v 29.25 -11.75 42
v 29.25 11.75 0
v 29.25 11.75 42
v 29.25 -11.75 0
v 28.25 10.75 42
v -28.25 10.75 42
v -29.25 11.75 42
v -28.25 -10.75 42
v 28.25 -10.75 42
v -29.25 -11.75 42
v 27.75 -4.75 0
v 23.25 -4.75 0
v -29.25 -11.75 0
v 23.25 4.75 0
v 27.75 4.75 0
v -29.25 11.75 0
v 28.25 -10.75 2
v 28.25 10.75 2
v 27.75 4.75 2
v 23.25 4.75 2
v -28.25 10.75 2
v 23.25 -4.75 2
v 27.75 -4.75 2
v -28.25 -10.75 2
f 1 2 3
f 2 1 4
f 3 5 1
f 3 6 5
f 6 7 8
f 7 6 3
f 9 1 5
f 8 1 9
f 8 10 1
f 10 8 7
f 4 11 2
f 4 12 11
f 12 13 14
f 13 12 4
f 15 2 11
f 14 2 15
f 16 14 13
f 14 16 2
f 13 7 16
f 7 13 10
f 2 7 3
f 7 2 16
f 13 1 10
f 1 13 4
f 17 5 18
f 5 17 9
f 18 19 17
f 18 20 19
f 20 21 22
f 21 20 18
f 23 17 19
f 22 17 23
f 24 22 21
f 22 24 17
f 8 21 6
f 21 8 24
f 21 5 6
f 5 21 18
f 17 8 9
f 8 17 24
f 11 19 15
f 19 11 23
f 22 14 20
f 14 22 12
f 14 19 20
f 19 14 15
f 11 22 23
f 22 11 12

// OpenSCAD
servo_y_dim = 20;
servo_x_dim = 55;
servo_z_dim = 40;

clearance = 1.5;

wall_thickness = 2;

servo_wire_y_dim = 8;
servo_wire_x_dim = 3;

difference(){
    translate([
        0,0,(servo_z_dim+wall_thickness)/2
    ])
    cube([
        servo_x_dim + wall_thickness + clearance,
        servo_y_dim + wall_thickness + clearance,
        servo_z_dim + wall_thickness
    ], center=true);

    translate([
        0,0,(servo_z_dim+wall_thickness)/2 + wall_thickness
    ])
    cube([
        servo_x_dim + clearance,
        servo_y_dim + clearance,
        servo_z_dim + wall_thickness
    ], center=true);
    
    // Servo wire hole
    translate([(servo_x_dim - 4)/2,0,0])
    cube([
        servo_wire_x_dim + clearance,
        servo_wire_y_dim + clearance,
        5
    ],center=true);
}
